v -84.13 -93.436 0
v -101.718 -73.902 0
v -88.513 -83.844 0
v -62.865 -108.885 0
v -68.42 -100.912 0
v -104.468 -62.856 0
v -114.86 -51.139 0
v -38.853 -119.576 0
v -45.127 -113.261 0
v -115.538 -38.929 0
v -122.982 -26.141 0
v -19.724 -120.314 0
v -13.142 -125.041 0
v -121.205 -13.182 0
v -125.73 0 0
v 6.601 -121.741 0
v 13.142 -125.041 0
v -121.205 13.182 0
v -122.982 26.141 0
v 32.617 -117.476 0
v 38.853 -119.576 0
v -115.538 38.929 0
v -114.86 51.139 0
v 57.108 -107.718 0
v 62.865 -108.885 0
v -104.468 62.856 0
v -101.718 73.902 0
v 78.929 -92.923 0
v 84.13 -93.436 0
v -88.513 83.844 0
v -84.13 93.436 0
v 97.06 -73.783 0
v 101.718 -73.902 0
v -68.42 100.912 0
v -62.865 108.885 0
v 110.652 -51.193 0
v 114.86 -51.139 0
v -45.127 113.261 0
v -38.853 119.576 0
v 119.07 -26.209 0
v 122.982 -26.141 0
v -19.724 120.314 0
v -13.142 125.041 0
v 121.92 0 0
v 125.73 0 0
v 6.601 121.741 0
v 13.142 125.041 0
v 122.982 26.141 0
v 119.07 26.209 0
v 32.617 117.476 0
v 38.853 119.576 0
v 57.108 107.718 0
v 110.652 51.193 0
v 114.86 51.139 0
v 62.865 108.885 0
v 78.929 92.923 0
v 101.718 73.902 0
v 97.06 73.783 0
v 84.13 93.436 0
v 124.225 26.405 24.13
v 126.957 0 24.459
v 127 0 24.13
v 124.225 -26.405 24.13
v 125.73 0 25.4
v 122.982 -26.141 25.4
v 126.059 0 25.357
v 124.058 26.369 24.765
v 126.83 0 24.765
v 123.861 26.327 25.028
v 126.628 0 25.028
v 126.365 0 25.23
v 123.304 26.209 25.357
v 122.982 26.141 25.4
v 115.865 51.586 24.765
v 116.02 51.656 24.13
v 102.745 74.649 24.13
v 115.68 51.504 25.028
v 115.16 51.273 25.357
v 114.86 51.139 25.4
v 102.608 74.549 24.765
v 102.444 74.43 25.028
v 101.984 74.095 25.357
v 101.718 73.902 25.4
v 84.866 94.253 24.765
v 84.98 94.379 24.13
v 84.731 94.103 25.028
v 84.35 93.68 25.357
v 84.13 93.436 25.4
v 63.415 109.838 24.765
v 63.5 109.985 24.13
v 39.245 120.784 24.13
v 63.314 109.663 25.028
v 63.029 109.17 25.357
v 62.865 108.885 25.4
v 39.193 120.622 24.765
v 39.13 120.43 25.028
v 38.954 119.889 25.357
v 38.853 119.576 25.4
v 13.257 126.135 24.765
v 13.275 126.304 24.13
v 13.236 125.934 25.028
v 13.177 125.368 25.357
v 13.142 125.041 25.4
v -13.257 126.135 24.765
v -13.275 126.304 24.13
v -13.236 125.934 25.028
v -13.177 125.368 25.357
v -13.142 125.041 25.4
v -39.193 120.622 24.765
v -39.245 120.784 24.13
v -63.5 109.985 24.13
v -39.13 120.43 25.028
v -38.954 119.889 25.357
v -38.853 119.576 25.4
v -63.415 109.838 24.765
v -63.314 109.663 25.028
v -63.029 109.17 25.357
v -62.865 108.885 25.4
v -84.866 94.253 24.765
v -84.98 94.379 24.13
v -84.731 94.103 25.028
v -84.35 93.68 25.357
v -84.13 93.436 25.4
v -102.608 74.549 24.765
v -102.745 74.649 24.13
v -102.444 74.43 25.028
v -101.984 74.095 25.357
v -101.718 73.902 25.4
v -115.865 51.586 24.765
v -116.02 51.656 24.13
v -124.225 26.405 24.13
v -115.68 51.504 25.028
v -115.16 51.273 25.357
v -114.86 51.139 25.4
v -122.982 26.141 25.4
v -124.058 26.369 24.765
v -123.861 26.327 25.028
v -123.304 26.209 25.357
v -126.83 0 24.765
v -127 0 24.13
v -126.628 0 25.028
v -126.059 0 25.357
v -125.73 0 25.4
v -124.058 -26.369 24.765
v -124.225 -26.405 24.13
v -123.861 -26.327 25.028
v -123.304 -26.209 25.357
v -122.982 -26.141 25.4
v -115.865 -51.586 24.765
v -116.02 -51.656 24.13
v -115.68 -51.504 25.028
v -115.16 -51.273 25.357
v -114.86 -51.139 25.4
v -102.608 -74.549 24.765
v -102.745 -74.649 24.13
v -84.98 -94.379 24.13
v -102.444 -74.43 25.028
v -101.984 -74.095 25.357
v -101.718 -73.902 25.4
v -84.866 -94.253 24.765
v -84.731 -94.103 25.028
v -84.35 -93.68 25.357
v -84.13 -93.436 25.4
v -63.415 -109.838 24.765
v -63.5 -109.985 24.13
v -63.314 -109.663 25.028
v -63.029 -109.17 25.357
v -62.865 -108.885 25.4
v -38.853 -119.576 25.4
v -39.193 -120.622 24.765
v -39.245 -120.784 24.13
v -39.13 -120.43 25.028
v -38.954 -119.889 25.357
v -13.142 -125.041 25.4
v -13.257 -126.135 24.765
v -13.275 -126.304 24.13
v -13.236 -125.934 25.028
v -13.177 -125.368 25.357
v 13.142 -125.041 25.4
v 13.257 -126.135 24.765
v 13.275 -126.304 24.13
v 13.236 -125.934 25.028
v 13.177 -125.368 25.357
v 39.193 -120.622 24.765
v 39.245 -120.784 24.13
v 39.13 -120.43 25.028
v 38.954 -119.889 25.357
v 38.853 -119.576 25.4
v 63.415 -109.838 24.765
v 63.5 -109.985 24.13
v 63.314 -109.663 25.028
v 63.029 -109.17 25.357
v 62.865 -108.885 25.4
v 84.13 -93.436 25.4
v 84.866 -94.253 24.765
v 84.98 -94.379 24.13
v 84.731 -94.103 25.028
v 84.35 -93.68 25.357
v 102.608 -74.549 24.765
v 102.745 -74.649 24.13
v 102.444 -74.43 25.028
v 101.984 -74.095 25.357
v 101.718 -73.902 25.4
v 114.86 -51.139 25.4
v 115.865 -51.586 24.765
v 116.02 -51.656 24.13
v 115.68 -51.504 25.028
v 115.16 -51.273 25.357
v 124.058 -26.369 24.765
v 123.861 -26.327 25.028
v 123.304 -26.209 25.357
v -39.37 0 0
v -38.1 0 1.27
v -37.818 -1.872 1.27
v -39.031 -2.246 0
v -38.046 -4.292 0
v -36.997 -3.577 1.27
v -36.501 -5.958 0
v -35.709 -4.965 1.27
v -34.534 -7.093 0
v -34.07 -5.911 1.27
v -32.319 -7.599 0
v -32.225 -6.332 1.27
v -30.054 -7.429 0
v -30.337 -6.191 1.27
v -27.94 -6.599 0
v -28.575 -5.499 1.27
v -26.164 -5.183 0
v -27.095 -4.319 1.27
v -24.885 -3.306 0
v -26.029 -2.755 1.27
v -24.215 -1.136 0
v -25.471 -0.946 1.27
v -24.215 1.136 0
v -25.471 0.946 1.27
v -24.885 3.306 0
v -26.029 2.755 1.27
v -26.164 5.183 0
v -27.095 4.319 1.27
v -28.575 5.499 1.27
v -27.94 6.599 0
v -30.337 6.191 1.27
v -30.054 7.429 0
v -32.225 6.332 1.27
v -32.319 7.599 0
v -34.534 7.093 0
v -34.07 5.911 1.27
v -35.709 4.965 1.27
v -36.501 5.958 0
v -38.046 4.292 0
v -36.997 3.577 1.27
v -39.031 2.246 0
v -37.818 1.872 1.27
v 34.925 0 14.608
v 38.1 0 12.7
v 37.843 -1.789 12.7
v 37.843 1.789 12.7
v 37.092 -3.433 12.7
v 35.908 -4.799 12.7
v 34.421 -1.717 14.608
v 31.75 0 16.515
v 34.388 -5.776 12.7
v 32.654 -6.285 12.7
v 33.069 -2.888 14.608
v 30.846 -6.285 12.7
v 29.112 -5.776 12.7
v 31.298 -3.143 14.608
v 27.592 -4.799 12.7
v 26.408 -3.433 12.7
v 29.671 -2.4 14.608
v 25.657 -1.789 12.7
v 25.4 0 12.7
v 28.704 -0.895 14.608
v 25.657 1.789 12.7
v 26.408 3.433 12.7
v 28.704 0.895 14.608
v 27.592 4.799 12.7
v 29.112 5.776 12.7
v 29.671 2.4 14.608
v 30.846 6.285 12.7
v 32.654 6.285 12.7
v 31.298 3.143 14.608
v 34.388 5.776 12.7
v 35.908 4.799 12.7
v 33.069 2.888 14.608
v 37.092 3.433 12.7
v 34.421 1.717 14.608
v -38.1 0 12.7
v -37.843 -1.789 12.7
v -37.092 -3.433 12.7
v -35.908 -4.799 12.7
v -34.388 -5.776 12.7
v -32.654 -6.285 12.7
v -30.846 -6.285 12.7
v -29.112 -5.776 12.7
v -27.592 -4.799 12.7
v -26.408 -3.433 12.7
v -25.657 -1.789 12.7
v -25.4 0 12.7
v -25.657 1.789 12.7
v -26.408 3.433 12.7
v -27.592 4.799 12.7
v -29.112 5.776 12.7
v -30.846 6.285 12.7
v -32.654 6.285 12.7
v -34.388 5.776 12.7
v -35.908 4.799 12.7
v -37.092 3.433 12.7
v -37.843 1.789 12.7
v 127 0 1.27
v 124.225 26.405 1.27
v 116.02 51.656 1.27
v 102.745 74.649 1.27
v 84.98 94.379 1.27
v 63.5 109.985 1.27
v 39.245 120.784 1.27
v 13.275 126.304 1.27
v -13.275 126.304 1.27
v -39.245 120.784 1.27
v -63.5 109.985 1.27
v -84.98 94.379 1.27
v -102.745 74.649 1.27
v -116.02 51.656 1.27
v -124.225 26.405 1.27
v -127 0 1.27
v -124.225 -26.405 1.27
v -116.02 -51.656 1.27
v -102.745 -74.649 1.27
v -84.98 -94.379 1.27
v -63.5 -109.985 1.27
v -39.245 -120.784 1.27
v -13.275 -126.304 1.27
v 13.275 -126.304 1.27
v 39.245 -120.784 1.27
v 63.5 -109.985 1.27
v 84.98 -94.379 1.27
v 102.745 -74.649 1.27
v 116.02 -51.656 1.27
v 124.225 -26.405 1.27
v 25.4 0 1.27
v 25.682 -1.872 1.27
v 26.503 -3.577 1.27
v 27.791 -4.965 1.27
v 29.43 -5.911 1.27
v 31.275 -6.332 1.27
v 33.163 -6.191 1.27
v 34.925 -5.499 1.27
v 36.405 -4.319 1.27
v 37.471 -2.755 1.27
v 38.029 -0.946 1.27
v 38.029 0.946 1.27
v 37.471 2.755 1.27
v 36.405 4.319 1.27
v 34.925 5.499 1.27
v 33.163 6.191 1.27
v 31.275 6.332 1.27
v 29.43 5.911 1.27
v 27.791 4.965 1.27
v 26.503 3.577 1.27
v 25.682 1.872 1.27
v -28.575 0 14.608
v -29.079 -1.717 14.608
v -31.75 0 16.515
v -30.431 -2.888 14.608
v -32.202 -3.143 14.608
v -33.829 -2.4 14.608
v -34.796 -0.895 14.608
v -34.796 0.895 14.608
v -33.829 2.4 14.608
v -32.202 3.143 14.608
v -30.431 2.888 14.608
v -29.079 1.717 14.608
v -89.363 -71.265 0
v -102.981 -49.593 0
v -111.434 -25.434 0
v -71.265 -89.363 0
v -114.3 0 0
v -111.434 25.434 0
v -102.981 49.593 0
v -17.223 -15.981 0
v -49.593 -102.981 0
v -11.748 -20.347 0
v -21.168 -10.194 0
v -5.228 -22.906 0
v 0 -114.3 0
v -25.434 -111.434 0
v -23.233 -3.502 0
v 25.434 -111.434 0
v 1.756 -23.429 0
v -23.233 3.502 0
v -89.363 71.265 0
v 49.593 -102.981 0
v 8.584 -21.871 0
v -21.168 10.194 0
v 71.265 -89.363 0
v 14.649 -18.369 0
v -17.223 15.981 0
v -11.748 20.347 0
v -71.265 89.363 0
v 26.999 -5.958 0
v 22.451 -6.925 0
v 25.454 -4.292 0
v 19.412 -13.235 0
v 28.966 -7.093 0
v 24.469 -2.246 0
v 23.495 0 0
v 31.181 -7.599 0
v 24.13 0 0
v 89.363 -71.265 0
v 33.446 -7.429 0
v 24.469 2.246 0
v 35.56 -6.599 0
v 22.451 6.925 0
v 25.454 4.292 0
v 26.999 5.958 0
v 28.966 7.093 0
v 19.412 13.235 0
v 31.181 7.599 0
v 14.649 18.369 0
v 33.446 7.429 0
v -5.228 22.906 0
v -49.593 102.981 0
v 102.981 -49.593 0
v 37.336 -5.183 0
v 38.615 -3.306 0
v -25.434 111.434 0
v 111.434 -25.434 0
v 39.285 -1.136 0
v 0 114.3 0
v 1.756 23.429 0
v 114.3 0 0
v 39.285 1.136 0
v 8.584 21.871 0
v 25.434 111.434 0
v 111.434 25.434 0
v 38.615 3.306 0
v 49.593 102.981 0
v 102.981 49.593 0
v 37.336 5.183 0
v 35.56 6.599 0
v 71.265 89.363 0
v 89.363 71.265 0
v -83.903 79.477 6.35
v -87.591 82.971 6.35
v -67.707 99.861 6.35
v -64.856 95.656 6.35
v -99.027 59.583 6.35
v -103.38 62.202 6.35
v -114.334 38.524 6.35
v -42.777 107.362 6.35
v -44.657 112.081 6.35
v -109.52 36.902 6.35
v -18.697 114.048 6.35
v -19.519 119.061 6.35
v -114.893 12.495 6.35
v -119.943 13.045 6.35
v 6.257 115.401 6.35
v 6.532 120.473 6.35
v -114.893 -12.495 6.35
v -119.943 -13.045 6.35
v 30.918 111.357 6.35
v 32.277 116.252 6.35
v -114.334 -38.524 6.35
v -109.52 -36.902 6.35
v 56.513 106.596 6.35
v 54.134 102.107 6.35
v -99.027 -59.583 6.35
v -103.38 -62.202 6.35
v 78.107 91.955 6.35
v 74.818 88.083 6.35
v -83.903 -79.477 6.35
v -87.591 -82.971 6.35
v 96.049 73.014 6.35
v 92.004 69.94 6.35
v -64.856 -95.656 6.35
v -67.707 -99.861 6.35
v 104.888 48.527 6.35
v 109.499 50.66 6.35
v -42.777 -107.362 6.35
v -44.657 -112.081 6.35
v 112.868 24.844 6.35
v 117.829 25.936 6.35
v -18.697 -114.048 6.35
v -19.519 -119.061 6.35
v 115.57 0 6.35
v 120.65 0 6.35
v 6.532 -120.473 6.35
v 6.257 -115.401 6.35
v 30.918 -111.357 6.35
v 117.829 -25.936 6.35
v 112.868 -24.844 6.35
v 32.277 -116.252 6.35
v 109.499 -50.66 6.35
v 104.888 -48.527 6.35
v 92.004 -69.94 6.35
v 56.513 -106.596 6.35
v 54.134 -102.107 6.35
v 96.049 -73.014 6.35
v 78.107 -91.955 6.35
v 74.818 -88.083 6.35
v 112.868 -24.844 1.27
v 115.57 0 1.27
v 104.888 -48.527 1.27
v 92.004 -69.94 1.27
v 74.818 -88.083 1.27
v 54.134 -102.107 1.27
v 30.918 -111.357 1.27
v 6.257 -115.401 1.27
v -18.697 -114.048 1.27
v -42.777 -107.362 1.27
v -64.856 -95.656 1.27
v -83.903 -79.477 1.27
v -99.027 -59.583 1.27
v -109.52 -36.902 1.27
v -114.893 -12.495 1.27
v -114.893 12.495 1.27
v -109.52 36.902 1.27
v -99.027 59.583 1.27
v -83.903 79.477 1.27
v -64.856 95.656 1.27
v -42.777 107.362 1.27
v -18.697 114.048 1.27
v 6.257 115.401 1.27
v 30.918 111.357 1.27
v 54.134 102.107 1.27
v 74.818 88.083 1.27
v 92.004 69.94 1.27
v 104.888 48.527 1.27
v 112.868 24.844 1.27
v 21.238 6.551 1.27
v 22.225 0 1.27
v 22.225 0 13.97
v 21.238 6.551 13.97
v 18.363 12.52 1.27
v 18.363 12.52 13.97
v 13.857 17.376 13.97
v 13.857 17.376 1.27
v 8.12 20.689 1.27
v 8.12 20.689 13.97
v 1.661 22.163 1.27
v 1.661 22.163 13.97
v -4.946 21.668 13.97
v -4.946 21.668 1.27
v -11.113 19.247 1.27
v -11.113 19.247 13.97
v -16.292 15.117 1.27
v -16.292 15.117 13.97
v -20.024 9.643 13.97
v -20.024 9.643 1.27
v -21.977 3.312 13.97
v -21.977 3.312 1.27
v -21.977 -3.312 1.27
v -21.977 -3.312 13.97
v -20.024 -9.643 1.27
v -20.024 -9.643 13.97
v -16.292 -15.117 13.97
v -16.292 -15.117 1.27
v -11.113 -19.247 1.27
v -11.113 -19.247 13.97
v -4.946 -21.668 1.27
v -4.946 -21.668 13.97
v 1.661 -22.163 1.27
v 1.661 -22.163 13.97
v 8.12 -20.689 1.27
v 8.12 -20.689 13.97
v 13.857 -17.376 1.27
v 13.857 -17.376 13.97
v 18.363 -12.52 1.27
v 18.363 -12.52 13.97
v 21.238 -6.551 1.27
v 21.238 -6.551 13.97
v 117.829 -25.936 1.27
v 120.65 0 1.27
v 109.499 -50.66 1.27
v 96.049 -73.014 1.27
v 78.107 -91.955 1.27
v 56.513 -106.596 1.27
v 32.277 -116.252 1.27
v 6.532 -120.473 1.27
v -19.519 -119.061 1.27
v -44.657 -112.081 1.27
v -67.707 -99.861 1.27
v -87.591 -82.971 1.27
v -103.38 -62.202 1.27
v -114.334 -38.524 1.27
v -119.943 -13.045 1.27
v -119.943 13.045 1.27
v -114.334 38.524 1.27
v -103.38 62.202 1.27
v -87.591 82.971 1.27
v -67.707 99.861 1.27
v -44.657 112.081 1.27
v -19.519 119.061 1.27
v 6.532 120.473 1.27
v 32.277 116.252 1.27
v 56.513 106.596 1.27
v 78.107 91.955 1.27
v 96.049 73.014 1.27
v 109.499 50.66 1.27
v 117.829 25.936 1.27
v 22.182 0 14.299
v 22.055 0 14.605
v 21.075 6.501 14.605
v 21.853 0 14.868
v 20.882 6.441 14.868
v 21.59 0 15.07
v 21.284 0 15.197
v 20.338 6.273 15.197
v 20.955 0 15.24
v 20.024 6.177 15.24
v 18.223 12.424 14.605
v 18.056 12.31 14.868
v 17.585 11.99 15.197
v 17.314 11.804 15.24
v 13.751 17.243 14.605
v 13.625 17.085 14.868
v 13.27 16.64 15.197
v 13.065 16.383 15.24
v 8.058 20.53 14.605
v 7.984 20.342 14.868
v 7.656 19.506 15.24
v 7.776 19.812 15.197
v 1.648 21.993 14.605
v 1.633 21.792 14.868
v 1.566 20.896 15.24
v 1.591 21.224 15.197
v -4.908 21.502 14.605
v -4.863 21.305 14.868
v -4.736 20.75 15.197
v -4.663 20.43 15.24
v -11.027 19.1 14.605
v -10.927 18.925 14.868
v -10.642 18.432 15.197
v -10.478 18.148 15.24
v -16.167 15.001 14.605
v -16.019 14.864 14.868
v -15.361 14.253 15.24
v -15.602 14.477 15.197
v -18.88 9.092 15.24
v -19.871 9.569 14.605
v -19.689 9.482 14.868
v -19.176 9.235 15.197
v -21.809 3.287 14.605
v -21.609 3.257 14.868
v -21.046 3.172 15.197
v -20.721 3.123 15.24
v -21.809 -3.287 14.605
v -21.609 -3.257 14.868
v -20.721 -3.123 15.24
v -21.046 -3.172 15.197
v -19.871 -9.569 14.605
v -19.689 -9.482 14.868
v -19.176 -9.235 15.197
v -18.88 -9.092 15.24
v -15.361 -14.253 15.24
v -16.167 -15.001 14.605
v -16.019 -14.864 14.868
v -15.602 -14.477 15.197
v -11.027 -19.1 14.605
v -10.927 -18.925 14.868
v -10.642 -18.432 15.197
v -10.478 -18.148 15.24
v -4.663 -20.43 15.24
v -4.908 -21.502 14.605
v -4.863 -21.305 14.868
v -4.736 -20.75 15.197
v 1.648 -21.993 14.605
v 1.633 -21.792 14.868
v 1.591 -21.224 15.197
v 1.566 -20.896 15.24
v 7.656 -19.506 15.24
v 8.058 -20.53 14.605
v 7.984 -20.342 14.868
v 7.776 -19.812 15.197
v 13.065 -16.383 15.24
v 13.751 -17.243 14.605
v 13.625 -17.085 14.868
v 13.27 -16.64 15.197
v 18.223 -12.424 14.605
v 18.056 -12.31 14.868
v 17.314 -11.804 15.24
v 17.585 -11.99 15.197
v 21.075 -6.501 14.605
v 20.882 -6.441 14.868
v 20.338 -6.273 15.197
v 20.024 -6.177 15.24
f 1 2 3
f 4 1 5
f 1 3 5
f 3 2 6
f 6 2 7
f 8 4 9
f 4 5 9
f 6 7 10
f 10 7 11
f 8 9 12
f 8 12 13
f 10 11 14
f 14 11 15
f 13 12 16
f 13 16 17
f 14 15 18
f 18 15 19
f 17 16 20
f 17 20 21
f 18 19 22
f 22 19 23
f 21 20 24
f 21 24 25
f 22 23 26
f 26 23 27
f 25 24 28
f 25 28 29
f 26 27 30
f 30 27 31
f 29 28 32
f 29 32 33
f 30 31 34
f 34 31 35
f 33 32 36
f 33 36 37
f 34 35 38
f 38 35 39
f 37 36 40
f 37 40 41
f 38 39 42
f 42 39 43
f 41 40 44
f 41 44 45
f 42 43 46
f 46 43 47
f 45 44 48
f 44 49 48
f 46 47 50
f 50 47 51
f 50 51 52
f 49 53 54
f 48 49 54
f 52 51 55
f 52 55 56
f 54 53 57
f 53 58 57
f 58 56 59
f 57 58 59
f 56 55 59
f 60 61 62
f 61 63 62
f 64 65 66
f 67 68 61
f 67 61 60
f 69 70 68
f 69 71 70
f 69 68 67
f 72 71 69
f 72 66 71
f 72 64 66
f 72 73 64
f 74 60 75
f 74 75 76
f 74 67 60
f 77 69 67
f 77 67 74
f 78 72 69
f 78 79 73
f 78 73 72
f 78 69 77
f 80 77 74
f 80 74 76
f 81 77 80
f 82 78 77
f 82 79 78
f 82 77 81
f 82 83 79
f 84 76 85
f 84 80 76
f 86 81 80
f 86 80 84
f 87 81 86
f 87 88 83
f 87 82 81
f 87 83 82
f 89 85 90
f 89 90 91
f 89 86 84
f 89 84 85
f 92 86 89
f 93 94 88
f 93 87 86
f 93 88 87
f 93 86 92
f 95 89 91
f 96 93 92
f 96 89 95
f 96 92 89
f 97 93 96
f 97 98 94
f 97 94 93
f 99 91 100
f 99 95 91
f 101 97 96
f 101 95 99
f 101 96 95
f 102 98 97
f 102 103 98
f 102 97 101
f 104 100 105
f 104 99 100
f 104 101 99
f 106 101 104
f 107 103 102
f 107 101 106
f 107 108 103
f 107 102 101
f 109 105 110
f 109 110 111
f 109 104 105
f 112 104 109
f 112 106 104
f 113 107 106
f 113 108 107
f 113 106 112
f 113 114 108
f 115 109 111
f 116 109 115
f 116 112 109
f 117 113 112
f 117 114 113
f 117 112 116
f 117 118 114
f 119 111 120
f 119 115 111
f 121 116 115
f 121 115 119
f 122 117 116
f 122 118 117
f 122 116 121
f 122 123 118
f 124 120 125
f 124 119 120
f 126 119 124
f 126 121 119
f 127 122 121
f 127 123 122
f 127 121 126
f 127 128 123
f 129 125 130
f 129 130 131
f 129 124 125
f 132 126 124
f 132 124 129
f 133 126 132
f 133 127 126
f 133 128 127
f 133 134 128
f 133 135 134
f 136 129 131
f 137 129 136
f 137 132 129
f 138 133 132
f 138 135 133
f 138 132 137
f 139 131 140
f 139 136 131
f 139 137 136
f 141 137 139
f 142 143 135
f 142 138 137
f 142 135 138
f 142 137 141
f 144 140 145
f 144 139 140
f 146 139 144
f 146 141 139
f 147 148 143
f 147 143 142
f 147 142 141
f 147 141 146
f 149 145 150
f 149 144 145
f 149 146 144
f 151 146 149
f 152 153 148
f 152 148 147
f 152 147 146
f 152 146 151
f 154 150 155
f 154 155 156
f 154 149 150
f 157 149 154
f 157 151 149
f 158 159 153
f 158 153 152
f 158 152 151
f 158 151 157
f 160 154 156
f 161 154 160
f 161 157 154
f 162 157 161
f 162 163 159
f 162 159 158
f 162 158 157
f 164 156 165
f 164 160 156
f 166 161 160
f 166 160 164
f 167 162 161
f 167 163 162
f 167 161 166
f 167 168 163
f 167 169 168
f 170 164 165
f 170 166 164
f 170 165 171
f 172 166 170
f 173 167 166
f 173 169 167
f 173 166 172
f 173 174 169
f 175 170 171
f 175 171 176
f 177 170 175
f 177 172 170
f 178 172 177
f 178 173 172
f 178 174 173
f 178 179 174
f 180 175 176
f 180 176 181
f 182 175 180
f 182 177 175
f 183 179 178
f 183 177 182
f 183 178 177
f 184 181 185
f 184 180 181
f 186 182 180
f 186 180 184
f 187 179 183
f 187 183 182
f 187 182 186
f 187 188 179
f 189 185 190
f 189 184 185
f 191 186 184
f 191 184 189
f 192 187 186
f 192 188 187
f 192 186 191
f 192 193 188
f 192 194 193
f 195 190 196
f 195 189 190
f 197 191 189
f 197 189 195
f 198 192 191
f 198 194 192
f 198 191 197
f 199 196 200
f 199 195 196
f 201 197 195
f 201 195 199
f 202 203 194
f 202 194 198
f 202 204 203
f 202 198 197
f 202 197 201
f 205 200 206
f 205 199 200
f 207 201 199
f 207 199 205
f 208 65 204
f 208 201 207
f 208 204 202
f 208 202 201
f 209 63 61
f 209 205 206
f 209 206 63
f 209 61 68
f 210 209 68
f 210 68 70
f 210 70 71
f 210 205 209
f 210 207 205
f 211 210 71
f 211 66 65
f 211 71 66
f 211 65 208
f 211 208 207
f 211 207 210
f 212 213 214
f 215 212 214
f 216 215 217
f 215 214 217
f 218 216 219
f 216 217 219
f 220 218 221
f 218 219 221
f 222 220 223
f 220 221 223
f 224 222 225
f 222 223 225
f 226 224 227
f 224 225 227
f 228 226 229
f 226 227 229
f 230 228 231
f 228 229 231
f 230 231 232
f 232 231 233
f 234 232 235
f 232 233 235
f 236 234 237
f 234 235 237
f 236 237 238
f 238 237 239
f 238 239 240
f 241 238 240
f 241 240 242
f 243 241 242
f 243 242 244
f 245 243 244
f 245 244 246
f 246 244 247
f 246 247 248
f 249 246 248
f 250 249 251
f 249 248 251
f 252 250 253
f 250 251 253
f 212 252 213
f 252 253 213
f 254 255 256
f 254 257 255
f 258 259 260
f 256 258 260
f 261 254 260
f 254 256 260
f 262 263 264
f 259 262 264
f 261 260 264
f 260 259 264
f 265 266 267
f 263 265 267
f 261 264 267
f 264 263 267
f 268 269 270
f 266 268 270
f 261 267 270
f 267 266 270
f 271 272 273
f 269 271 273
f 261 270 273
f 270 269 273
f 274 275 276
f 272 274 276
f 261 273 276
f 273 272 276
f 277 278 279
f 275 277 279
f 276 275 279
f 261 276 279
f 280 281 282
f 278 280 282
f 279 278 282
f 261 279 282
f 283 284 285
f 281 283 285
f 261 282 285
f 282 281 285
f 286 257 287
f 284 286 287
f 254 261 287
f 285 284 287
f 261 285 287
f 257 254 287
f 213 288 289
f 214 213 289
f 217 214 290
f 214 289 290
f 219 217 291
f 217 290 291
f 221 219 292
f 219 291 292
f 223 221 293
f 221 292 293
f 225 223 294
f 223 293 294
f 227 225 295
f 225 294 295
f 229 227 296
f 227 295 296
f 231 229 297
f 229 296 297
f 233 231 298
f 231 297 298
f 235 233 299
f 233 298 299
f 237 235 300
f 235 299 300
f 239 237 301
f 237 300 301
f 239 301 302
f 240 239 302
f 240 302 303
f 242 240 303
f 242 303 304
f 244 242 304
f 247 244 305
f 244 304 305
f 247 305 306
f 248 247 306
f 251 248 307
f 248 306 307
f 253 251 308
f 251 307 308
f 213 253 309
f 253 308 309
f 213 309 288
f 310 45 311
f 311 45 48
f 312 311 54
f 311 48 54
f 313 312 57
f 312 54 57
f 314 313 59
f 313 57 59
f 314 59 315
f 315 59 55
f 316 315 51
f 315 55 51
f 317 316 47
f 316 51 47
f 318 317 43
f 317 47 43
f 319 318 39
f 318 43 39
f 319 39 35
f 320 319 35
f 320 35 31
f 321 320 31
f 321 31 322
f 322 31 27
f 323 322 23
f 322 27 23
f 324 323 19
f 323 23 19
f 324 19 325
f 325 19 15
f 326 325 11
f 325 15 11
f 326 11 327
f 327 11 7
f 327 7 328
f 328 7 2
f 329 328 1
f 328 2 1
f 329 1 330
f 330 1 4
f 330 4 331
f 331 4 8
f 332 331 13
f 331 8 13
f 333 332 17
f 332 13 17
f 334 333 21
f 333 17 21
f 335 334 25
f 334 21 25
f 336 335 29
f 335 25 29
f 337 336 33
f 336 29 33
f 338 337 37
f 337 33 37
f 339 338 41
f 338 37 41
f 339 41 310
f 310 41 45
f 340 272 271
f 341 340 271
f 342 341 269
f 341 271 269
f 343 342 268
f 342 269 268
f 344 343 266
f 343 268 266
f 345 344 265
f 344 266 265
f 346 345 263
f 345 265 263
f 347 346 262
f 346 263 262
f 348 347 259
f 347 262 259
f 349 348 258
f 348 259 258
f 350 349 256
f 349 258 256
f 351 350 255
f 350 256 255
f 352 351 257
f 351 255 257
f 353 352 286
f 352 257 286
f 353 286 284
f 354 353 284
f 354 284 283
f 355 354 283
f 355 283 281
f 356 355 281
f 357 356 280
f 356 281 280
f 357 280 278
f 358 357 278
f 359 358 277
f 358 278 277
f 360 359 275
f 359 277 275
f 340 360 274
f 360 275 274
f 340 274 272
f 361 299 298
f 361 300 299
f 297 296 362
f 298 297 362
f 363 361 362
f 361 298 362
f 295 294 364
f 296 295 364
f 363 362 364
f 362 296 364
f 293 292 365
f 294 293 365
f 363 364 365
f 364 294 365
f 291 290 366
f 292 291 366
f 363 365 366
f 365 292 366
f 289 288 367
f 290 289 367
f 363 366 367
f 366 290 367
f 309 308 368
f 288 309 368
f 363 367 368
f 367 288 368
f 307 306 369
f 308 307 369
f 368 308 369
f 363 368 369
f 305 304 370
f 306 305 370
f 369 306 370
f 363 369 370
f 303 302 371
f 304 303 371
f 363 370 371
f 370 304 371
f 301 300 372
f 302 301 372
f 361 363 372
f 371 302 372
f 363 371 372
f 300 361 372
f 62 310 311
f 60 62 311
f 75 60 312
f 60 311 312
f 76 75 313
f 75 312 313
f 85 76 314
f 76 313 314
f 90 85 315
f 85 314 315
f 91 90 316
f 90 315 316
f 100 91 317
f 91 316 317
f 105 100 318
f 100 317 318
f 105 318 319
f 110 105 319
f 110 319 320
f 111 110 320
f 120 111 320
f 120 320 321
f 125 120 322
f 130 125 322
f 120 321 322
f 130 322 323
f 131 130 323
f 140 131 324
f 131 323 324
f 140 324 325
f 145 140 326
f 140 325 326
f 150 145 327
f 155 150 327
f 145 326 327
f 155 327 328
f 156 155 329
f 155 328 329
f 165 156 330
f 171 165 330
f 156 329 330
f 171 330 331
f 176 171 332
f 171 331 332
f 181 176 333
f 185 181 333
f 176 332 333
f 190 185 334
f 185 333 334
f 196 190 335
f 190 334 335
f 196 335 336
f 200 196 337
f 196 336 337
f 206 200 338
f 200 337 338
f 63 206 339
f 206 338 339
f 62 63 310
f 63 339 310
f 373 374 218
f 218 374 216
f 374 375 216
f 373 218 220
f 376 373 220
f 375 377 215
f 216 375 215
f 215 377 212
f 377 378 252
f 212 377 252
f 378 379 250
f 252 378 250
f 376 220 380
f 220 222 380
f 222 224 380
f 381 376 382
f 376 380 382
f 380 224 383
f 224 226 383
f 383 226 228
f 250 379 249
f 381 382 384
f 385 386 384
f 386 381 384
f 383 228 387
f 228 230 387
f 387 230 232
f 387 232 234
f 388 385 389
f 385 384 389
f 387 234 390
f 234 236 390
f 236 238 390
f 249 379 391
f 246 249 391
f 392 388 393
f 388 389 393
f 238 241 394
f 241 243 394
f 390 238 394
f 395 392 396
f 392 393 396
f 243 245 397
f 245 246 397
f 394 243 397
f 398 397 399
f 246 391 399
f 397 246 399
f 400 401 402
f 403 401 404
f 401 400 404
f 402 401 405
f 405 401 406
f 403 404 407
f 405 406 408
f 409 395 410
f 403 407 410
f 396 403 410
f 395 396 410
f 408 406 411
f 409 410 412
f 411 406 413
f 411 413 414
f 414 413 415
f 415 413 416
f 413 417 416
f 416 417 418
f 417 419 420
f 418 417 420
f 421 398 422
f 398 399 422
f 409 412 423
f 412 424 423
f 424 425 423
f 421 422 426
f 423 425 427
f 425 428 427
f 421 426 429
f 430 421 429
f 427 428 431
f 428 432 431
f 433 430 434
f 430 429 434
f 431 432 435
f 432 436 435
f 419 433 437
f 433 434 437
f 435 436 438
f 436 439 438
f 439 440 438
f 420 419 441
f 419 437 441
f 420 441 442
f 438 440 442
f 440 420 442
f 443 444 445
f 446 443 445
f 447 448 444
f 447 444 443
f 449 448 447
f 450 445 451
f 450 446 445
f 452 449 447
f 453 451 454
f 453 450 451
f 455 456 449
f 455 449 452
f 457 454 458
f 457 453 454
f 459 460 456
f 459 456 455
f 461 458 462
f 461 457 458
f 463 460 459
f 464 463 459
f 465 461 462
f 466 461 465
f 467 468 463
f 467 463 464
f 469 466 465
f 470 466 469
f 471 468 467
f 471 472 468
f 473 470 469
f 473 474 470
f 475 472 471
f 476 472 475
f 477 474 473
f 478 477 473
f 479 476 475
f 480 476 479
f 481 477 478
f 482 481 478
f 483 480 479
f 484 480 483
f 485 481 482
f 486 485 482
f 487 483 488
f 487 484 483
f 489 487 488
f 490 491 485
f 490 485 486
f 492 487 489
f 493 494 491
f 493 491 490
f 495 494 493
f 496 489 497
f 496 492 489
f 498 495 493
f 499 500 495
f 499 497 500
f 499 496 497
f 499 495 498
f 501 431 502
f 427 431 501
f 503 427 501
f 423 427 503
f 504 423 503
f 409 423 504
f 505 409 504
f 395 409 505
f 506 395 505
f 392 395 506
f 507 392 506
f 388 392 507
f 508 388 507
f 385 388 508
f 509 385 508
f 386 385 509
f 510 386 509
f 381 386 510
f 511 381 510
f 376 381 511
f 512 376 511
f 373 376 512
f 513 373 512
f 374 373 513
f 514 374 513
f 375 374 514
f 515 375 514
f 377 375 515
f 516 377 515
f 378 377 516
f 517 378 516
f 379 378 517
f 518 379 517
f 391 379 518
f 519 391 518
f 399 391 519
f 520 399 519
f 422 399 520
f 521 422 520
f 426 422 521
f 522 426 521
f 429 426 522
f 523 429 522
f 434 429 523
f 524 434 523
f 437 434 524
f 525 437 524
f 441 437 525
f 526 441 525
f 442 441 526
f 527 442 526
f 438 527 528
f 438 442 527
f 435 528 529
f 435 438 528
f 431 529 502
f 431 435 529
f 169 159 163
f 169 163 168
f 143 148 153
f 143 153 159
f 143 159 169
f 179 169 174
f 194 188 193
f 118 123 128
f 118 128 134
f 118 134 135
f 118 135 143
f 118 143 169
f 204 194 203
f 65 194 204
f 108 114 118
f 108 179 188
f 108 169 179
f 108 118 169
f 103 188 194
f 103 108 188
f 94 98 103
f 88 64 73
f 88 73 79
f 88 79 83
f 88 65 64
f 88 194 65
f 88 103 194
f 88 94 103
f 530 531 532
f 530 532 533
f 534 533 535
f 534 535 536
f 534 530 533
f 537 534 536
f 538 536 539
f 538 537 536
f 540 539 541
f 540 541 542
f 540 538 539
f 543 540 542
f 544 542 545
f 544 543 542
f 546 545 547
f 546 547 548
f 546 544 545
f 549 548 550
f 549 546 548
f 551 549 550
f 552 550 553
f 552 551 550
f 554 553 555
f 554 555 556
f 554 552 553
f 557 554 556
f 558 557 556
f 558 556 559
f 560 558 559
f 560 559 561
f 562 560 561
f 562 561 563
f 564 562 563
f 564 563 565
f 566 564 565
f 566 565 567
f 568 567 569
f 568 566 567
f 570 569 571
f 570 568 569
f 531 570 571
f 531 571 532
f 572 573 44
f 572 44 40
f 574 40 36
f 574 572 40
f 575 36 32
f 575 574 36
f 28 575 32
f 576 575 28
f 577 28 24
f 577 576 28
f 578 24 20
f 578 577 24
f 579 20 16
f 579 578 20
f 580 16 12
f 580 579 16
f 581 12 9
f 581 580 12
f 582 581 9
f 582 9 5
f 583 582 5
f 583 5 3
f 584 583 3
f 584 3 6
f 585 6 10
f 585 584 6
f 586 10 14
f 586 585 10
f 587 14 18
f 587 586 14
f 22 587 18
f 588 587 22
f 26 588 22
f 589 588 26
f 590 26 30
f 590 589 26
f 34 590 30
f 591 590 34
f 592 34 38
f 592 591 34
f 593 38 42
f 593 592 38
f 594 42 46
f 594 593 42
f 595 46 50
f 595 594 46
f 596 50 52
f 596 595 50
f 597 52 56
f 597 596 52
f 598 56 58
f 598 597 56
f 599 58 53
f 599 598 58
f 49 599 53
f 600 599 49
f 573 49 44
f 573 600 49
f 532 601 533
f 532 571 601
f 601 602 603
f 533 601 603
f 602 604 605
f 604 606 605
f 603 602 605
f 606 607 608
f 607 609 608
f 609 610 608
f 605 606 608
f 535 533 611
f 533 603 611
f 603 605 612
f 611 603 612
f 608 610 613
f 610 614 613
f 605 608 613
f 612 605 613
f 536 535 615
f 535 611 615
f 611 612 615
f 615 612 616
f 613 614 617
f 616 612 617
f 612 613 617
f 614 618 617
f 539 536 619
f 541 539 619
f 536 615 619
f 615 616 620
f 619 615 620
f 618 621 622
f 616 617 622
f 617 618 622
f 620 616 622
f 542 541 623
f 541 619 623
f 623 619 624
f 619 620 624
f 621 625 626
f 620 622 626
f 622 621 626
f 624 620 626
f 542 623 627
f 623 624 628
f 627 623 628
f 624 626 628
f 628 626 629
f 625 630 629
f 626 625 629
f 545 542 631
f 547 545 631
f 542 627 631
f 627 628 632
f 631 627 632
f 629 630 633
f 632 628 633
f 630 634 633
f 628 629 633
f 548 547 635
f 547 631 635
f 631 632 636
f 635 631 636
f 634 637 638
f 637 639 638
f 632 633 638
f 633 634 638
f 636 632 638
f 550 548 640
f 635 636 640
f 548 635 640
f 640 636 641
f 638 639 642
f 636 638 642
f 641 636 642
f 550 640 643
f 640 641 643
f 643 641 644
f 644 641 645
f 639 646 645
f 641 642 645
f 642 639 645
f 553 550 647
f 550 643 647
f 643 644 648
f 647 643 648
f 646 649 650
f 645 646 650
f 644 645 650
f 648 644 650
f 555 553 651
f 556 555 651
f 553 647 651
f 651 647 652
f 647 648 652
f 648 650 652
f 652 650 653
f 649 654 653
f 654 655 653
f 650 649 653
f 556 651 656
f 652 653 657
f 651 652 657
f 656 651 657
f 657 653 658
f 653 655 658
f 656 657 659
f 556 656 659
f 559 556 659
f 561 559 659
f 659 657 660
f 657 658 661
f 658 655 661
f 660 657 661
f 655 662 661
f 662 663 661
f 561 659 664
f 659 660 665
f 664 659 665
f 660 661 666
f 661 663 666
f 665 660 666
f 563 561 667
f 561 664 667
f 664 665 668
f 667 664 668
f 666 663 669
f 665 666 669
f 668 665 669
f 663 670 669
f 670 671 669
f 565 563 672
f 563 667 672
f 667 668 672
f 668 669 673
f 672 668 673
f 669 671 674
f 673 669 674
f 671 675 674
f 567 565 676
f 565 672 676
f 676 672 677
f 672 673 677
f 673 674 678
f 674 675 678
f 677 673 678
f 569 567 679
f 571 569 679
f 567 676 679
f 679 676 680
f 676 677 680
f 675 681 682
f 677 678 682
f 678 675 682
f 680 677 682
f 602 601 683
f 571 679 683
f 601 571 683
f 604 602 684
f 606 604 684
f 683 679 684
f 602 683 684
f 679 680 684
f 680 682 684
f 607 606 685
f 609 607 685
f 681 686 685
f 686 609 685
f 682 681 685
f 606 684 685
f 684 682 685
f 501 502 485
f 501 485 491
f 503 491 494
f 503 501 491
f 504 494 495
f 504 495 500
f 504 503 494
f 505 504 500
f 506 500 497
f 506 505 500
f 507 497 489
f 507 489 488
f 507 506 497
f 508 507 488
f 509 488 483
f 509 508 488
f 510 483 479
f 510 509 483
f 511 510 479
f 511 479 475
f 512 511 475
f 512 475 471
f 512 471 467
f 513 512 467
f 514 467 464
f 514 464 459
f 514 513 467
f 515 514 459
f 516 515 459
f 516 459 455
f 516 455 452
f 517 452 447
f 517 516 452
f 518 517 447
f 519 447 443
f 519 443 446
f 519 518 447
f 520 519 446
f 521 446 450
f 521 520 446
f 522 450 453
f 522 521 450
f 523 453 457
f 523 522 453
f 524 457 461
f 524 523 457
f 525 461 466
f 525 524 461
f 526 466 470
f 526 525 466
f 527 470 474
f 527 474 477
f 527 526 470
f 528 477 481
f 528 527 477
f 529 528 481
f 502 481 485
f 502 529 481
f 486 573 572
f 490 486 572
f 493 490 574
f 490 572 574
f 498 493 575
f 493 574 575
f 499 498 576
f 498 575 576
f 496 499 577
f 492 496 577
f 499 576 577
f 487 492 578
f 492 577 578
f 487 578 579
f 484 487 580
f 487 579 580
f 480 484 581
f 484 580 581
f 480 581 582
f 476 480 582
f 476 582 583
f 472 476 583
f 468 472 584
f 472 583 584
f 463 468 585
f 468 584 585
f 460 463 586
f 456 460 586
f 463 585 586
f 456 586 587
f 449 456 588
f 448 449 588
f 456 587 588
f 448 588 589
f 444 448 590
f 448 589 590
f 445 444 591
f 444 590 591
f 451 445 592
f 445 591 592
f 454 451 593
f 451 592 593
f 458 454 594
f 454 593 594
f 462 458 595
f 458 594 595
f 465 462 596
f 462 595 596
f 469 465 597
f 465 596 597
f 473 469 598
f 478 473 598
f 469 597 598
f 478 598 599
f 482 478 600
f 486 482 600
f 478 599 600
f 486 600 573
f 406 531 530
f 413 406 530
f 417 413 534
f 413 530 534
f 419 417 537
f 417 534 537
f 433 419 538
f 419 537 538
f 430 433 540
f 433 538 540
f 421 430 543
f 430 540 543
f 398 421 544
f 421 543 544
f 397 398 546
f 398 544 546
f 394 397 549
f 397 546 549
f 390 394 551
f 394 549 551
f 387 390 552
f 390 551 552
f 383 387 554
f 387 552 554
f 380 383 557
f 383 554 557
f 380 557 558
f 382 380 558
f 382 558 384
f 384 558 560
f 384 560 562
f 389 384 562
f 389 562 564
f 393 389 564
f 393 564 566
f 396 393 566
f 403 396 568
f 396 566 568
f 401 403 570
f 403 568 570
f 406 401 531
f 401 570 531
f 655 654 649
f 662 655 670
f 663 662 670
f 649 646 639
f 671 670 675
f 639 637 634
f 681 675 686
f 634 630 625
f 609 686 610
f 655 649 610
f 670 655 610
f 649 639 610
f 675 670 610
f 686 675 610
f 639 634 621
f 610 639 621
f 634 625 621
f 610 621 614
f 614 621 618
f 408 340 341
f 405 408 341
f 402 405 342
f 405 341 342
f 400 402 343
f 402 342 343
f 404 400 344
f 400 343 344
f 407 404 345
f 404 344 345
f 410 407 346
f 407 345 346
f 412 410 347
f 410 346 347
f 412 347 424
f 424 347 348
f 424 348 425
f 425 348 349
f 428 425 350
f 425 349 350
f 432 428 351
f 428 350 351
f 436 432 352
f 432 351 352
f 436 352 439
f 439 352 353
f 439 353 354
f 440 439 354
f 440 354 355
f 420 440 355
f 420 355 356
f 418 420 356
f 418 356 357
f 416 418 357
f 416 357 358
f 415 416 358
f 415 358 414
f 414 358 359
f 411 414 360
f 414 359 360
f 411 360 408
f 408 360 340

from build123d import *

# Parameters (mm, degrees)
F0_R     = 127
F1_DEPTH = 25.4
F2_R     = 120.65
F2_R_2   = 115.57
F4_DEPTH = 6.35
F3_R     = 22.225
F6_DEPTH = 15.24
F7_D     = 12.7
F7_DEPTH = 12.7
F7_TIP   = 3.8154649308
F8_R     = 1.27
F9_SIZE  = 1.27


with BuildPart() as f1:
    # F0 (on Top) → F1 (new body)
    with BuildSketch(Plane.XY):
        Circle(F0_R)
    extrude(amount=F1_DEPTH)

    # F2 (on face) → F4 (cut)
    with BuildSketch(Plane(origin=(0, 0, 0), x_dir=(1, 0, 0), z_dir=(0, 0, -1))):
        Circle(F2_R)
        Circle(F2_R_2, mode=Mode.SUBTRACT)
    extrude(amount=-F4_DEPTH, mode=Mode.SUBTRACT)

    # F3 (on Top) → F6 (cut)
    with BuildSketch(Plane.XY):
        Circle(F3_R)
    extrude(amount=F6_DEPTH, mode=Mode.SUBTRACT)

    # F7
    with Locations(Plane(origin=(0, 0, 0), x_dir=(1, 0, 0), z_dir=(0, 0, -1))):
        with Locations((31.75, 0), (-31.75, 0)):
            Hole(F7_D / 2, depth=F7_DEPTH)
            with Locations((0, 0, -(F7_DEPTH + F7_TIP / 2))):  # 118° drill point
                Cone(0, F7_D / 2, F7_TIP, mode=Mode.SUBTRACT)

    # F8
    f8_edges = [f1.edges().sort_by_distance(p)[0] for p in [
        (-22.225, 0, 15.24),
        (-127, 0, 25.4),
    ]]
    fillet(f8_edges, radius=F8_R)

    # F9
    f9_edges = [f1.edges().sort_by_distance(p)[0] for p in [
        (-22.225, 0, 0),
        (-115.57, 0, 0),
        (-120.65, 0, 0),
        (-127, 0, 0),
        (-38.1, 0, 0),
        (25.4, 0, 0),
    ]]
    chamfer(f9_edges, length=F9_SIZE)


solid = f1.part
